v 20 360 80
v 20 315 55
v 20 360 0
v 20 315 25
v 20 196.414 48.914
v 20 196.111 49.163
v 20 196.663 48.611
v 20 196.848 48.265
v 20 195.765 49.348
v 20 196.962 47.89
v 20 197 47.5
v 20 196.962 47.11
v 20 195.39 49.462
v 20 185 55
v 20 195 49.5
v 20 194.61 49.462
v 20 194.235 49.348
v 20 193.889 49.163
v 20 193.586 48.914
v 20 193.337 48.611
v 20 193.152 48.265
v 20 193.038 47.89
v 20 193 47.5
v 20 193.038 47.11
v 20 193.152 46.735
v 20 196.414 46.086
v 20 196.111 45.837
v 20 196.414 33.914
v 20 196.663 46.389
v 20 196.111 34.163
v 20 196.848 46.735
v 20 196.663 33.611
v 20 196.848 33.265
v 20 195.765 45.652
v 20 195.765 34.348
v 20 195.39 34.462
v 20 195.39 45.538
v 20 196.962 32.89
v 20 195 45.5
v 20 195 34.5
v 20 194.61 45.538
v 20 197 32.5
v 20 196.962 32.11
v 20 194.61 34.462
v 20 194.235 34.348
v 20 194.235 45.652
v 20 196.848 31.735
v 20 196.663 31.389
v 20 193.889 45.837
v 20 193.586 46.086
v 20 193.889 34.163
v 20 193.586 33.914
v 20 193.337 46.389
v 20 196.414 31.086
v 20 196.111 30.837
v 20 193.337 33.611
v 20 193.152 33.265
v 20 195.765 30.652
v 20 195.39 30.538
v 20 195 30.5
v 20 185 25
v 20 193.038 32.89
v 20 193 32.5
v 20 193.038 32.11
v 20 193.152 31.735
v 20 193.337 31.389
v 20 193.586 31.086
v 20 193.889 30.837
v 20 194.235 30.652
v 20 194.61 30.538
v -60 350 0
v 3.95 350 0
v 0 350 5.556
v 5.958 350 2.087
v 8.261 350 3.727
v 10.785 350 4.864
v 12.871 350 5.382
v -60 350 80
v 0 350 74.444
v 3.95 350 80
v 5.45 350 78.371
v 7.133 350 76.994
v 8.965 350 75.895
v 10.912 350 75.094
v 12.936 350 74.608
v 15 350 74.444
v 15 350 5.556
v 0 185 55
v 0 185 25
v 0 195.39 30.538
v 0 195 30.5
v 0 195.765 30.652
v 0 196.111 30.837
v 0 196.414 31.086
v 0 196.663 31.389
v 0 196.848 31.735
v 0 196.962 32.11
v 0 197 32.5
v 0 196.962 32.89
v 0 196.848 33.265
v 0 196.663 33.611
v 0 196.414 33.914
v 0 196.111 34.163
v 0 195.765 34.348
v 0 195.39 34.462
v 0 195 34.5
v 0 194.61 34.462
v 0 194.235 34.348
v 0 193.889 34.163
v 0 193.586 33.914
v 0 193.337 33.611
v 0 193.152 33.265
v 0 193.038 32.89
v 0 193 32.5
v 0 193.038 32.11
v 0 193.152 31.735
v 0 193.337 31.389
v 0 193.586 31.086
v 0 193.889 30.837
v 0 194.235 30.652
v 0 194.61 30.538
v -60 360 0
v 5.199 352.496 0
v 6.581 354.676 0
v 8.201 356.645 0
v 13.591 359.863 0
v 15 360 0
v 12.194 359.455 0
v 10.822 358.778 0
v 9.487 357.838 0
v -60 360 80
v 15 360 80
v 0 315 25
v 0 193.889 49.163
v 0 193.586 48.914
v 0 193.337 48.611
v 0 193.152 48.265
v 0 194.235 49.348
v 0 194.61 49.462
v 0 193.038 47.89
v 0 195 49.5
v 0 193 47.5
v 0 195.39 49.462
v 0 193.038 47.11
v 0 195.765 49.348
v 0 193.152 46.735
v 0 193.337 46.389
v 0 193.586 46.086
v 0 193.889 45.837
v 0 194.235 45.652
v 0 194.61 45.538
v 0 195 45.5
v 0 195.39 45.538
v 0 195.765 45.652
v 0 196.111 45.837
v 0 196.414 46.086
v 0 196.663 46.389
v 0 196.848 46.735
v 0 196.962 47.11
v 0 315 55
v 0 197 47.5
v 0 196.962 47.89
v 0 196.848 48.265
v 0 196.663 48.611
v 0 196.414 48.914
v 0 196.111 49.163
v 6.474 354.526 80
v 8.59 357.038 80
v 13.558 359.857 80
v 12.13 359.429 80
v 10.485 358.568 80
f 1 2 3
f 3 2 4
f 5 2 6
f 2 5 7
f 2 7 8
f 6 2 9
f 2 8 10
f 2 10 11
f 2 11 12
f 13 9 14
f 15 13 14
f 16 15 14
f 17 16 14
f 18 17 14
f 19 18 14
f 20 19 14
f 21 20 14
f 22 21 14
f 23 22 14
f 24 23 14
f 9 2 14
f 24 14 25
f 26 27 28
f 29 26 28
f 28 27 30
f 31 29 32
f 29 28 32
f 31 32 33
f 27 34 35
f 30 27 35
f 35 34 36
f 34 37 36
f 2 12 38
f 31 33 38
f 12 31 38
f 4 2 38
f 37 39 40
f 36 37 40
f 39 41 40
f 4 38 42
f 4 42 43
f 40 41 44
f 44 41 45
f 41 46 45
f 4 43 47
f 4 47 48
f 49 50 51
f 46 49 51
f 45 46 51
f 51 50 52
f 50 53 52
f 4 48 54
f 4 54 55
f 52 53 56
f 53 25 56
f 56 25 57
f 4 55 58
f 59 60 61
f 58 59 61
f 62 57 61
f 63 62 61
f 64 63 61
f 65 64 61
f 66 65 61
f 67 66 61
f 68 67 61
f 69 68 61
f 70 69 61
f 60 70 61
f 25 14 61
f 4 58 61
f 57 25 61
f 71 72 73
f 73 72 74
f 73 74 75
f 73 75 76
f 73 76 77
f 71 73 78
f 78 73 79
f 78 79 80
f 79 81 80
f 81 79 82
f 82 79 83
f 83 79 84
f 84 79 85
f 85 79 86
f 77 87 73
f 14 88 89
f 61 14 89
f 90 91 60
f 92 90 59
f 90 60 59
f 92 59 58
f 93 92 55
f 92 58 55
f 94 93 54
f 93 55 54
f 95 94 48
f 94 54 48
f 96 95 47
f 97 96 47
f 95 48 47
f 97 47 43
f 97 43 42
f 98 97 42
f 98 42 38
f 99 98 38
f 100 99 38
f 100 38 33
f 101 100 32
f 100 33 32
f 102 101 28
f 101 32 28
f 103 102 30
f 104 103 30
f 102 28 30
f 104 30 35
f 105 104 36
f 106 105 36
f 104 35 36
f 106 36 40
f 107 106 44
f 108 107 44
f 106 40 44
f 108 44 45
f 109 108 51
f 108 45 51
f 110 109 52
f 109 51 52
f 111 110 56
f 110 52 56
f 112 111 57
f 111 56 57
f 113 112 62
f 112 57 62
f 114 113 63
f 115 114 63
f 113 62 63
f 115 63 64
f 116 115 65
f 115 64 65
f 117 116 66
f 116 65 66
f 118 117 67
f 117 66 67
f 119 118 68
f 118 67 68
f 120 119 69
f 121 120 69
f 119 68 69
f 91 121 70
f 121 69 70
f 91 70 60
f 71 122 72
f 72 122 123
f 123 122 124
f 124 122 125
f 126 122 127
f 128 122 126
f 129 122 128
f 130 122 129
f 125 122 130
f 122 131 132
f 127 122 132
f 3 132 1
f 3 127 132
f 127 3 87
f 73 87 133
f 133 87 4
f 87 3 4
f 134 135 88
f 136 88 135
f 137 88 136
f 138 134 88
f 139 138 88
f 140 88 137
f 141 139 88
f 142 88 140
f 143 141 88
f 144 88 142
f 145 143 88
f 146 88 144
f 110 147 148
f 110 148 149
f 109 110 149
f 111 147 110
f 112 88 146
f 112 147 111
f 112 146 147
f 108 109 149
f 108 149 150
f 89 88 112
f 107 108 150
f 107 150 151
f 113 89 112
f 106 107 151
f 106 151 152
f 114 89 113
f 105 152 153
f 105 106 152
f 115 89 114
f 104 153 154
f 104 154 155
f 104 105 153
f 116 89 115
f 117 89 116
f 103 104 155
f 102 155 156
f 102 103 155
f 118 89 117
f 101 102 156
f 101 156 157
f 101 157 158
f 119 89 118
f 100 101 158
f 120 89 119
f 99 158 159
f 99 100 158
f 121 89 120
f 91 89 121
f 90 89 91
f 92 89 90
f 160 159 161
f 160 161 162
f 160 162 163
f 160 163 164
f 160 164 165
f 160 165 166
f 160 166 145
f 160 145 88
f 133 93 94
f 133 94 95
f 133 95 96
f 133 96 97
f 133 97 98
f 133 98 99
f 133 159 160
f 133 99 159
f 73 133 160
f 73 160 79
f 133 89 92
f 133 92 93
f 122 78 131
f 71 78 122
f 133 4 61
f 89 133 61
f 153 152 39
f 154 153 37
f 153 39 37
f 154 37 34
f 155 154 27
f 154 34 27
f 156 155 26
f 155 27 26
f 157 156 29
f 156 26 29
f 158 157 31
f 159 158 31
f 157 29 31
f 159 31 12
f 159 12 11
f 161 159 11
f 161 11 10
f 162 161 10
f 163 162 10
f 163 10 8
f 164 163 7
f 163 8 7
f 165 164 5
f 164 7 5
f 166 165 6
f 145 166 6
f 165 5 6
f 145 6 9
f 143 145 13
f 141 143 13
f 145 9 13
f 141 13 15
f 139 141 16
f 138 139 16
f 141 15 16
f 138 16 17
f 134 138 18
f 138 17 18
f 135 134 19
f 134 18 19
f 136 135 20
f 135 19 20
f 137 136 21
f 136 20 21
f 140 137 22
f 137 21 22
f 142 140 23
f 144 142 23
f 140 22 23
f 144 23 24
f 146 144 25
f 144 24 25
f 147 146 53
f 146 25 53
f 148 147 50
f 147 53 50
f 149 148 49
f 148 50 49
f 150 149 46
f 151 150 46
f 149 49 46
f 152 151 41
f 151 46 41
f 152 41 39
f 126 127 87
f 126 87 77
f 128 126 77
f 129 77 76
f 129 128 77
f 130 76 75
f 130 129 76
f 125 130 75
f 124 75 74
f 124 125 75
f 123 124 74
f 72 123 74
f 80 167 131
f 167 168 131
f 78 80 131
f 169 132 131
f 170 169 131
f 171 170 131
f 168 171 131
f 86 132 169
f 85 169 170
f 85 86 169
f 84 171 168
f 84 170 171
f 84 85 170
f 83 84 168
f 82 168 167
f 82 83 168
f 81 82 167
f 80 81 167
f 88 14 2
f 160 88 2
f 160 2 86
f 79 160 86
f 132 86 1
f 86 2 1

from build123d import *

# Parameters (mm, degrees)
SUPPORT_BALISE_W                           = 20
SUPPORT_BALISE_H                           = 350
SUPPORT_BALISE_BOSSAGE_DEPTH               = 80
ESQUISSE3_W                                = 80
ESQUISSE3_H                                = 80
SUPPORT_CHEVAL_ENLEVEMENT_DE_MATIERE_DEPTH = 10
ESQUISSE8_W                                = 10
ESQUISSE8_H                                = 70
SUPPORT_CHEVAL_DEPTH                       = 80
VIS_REACH                                  = 376.466
SERRAGE_VIS_R                              = 2.5
VIS_DIRECTION_2_DEPTH                      = 375.466286867
ENL_V_MAT_EXTRU_5_DEPTH                    = 20
POUR_IMPRESSION_R                          = 15
FIXATION_POUR_ASSEMBLAGE_R                 = 2
VIS_POUR_ASSEMBLAGE_DEPTH                  = 20
ENL_V_MAT_EXTRU_6_DEPTH                    = 378.359245282
ENL_V_MAT_EXTRU_6_DEPTH_BACK               = 378.359245282
PARTIE_HAUTE_W                             = 433.052929697
PARTIE_HAUTE_H                             = 227.316532038


with BuildPart() as part:
    # Support Balise → Support balise bossage (new body)
    with BuildSketch(Plane.XY):
        with Locations((10, 175)):
            Rectangle(SUPPORT_BALISE_W, SUPPORT_BALISE_H)
    extrude(amount=SUPPORT_BALISE_BOSSAGE_DEPTH)

    # Esquisse3 → Support Cheval enlevement de matiere (add)
    with BuildSketch(Plane(origin=(0, 350, 0), x_dir=(1, 0, 0), z_dir=(0, 1, 0))):
        with Locations((-20, -40)):
            Rectangle(ESQUISSE3_W, ESQUISSE3_H)
    extrude(amount=SUPPORT_CHEVAL_ENLEVEMENT_DE_MATIERE_DEPTH)

    # Esquisse8 → Support Cheval (cut)
    with BuildSketch(Plane.XY.offset(80)):
        with Locations((10, 35)):
            Rectangle(ESQUISSE8_W, ESQUISSE8_H)
    extrude(amount=-SUPPORT_CHEVAL_DEPTH, mode=Mode.SUBTRACT)

    # Vis: up to this face of the body (flat: up to its plane)
    vis_end = Plane(part.part.faces().sort_by_distance((0, 175, 40))[0])
    # Serrage vis → Vis (cut, up to the picked face)
    with BuildSketch(Plane(origin=(5, 0, 0), x_dir=(0, 0, -1), z_dir=(1, 0, 0)), mode=Mode.PRIVATE) as vis_sk1:
        with Locations((-70, 11.284552026)):
            Circle(SERRAGE_VIS_R)
    vis_tool1 = split(extrude(vis_sk1.sketch, amount=-VIS_REACH, mode=Mode.PRIVATE), bisect_by=vis_end, keep=Keep.BOTH, mode=Mode.PRIVATE)
    # Serrage vis → Vis (cut, up to the picked face)
    with BuildSketch(Plane(origin=(5, 0, 0), x_dir=(0, 0, -1), z_dir=(1, 0, 0)), mode=Mode.PRIVATE) as vis_sk2:
        with Locations((-70, 53.057184379)):
            Circle(SERRAGE_VIS_R)
    vis_tool2 = split(extrude(vis_sk2.sketch, amount=-VIS_REACH, mode=Mode.PRIVATE), bisect_by=vis_end, keep=Keep.BOTH, mode=Mode.PRIVATE)
    # Serrage vis → Vis (cut, up to the picked face)
    with BuildSketch(Plane(origin=(5, 0, 0), x_dir=(0, 0, -1), z_dir=(1, 0, 0)), mode=Mode.PRIVATE) as vis_sk3:
        with Locations((-10, 53.057184379)):
            Circle(SERRAGE_VIS_R)
    vis_tool3 = split(extrude(vis_sk3.sketch, amount=-VIS_REACH, mode=Mode.PRIVATE), bisect_by=vis_end, keep=Keep.BOTH, mode=Mode.PRIVATE)
    # Serrage vis → Vis (cut, up to the picked face)
    with BuildSketch(Plane(origin=(5, 0, 0), x_dir=(0, 0, -1), z_dir=(1, 0, 0)), mode=Mode.PRIVATE) as vis_sk4:
        with Locations((-10, 11.284552026)):
            Circle(SERRAGE_VIS_R)
    vis_tool4 = split(extrude(vis_sk4.sketch, amount=-VIS_REACH, mode=Mode.PRIVATE), bisect_by=vis_end, keep=Keep.BOTH, mode=Mode.PRIVATE)
    # Serrage vis → Vis (cut, up to the picked face)
    with BuildSketch(Plane(origin=(5, 0, 0), x_dir=(0, 0, -1), z_dir=(1, 0, 0)), mode=Mode.PRIVATE) as vis_sk5:
        with Locations((-40, 32.170868202)):
            Circle(SERRAGE_VIS_R)
    vis_tool5 = split(extrude(vis_sk5.sketch, amount=-VIS_REACH, mode=Mode.PRIVATE), bisect_by=vis_end, keep=Keep.BOTH, mode=Mode.PRIVATE)
    add(vis_tool1.solids().sort_by(Axis((5, 11.284552, 70), (-1, 0, 0)))[0], mode=Mode.SUBTRACT)
    add(vis_tool2.solids().sort_by(Axis((5, 53.057184, 70), (-1, 0, 0)))[0], mode=Mode.SUBTRACT)
    add(vis_tool3.solids().sort_by(Axis((5, 53.057184, 10), (-1, 0, 0)))[0], mode=Mode.SUBTRACT)
    add(vis_tool4.solids().sort_by(Axis((5, 11.284552, 10), (-1, 0, 0)))[0], mode=Mode.SUBTRACT)
    add(vis_tool5.solids().sort_by(Axis((5, 32.170868, 40), (-1, 0, 0)))[0], mode=Mode.SUBTRACT)

    # Serrage vis → Vis direction 2 (cut)
    with BuildSketch(Plane(origin=(5, 0, 0), x_dir=(0, 0, -1), z_dir=(1, 0, 0))):
        with Locations((-70, 11.284552026)):
            Circle(SERRAGE_VIS_R)
        with Locations((-70, 53.057184379)):
            Circle(SERRAGE_VIS_R)
        with Locations((-10, 53.057184379)):
            Circle(SERRAGE_VIS_R)
        with Locations((-10, 11.284552026)):
            Circle(SERRAGE_VIS_R)
        with Locations((-40, 32.170868202)):
            Circle(SERRAGE_VIS_R)
    extrude(amount=VIS_DIRECTION_2_DEPTH, mode=Mode.SUBTRACT)

    # Design → Enlèv. mat.-Extru.5 (cut)
    with BuildSketch(Plane(origin=(20, 0, 0), x_dir=(0, 0, -1), z_dir=(1, 0, 0))):
        Polygon((-55, 315), (-80, 360), (-80, 92.406088827), (-55, 137.406088827), align=None)
        Polygon((0, 92.406088827), (0, 360), (-25, 315), (-25, 137.406088827), align=None)
    extrude(amount=-ENL_V_MAT_EXTRU_5_DEPTH, mode=Mode.SUBTRACT)

    # Pour Impression
    # the kernel refuses this fillet: 15 mm, written as the material it adds along each edge
    with BuildSketch(Plane(origin=(0, 392.780897855, -18.211609919), x_dir=(1, 0, 0), z_dir=(0, -0.8741572761215375, 0.48564293117863266))) as pour_impression_piece_1_section:
        with BuildLine():
            CenterArc((POUR_IMPRESSION_R, -POUR_IMPRESSION_R), POUR_IMPRESSION_R, 90, 90)
            Line((0, -POUR_IMPRESSION_R), (0, 0))
            Line((0, 0), (POUR_IMPRESSION_R, 0))
        make_face()
    pour_impression_piece_1 = extrude(amount=86.439589046, mode=Mode.PRIVATE)
    pour_impression_piece_1 = split(pour_impression_piece_1, bisect_by=Plane(origin=(4.741525676, 350, 2.029382941), z_dir=(0, 1, 0)), keep=Keep.TOP, mode=Mode.PRIVATE)
    pour_impression_piece_1 = split(pour_impression_piece_1, bisect_by=Plane(origin=(4.741525676, 353.652889294, 0), z_dir=(0, 0, 1)), keep=Keep.TOP, mode=Mode.PRIVATE)
    add(pour_impression_piece_1)
    with BuildSketch(Plane(origin=(0, 317.219102145, 56.232834525), x_dir=(1, 0, 0), z_dir=(0, 0.8741572761215377, 0.4856429311786322))) as pour_impression_piece_2_section:
        with BuildLine():
            CenterArc((POUR_IMPRESSION_R, -POUR_IMPRESSION_R), POUR_IMPRESSION_R, 90, 90)
            Line((0, -POUR_IMPRESSION_R), (0, 0))
            Line((0, 0), (POUR_IMPRESSION_R, 0))
        make_face()
    pour_impression_piece_2 = extrude(amount=86.439589046, mode=Mode.PRIVATE)
    pour_impression_piece_2 = split(pour_impression_piece_2, bisect_by=Plane(origin=(4.741525676, 350, 77.970617059), z_dir=(0, 1, 0)), keep=Keep.TOP, mode=Mode.PRIVATE)
    pour_impression_piece_2 = split(pour_impression_piece_2, bisect_by=Plane(origin=(4.741525676, 353.652889294, 80), z_dir=(0, 0, -1)), keep=Keep.TOP, mode=Mode.PRIVATE)
    add(pour_impression_piece_2)

    # Fixation pour assemblage → Vis pour Assemblage (cut)
    with BuildSketch(Plane(origin=(20, 0, 0), x_dir=(0, 0, -1), z_dir=(1, 0, 0))):
        with Locations((-47.5, 195)):
            Circle(FIXATION_POUR_ASSEMBLAGE_R)
        with Locations((-32.5, 195)):
            Circle(FIXATION_POUR_ASSEMBLAGE_R)
        with Locations((-32.5, 175)):
            Circle(FIXATION_POUR_ASSEMBLAGE_R)
        with Locations((-47.5, 175)):
            Circle(FIXATION_POUR_ASSEMBLAGE_R)
    extrude(amount=-VIS_POUR_ASSEMBLAGE_DEPTH, mode=Mode.SUBTRACT)

    # Partie_Haute → Enlèv. mat.-Extru.6 (cut, two sides: drawn at the far end of the back side and taken through both)
    with BuildSketch(Plane(origin=(20, 0, 0), x_dir=(0, 0, -1), z_dir=(1, 0, 0)).offset(-ENL_V_MAT_EXTRU_6_DEPTH_BACK)):
        with Locations((7.967088797, 71.341733981)):
            Rectangle(PARTIE_HAUTE_W, PARTIE_HAUTE_H)
    extrude(amount=ENL_V_MAT_EXTRU_6_DEPTH + ENL_V_MAT_EXTRU_6_DEPTH_BACK, mode=Mode.SUBTRACT)


solid = part.part
